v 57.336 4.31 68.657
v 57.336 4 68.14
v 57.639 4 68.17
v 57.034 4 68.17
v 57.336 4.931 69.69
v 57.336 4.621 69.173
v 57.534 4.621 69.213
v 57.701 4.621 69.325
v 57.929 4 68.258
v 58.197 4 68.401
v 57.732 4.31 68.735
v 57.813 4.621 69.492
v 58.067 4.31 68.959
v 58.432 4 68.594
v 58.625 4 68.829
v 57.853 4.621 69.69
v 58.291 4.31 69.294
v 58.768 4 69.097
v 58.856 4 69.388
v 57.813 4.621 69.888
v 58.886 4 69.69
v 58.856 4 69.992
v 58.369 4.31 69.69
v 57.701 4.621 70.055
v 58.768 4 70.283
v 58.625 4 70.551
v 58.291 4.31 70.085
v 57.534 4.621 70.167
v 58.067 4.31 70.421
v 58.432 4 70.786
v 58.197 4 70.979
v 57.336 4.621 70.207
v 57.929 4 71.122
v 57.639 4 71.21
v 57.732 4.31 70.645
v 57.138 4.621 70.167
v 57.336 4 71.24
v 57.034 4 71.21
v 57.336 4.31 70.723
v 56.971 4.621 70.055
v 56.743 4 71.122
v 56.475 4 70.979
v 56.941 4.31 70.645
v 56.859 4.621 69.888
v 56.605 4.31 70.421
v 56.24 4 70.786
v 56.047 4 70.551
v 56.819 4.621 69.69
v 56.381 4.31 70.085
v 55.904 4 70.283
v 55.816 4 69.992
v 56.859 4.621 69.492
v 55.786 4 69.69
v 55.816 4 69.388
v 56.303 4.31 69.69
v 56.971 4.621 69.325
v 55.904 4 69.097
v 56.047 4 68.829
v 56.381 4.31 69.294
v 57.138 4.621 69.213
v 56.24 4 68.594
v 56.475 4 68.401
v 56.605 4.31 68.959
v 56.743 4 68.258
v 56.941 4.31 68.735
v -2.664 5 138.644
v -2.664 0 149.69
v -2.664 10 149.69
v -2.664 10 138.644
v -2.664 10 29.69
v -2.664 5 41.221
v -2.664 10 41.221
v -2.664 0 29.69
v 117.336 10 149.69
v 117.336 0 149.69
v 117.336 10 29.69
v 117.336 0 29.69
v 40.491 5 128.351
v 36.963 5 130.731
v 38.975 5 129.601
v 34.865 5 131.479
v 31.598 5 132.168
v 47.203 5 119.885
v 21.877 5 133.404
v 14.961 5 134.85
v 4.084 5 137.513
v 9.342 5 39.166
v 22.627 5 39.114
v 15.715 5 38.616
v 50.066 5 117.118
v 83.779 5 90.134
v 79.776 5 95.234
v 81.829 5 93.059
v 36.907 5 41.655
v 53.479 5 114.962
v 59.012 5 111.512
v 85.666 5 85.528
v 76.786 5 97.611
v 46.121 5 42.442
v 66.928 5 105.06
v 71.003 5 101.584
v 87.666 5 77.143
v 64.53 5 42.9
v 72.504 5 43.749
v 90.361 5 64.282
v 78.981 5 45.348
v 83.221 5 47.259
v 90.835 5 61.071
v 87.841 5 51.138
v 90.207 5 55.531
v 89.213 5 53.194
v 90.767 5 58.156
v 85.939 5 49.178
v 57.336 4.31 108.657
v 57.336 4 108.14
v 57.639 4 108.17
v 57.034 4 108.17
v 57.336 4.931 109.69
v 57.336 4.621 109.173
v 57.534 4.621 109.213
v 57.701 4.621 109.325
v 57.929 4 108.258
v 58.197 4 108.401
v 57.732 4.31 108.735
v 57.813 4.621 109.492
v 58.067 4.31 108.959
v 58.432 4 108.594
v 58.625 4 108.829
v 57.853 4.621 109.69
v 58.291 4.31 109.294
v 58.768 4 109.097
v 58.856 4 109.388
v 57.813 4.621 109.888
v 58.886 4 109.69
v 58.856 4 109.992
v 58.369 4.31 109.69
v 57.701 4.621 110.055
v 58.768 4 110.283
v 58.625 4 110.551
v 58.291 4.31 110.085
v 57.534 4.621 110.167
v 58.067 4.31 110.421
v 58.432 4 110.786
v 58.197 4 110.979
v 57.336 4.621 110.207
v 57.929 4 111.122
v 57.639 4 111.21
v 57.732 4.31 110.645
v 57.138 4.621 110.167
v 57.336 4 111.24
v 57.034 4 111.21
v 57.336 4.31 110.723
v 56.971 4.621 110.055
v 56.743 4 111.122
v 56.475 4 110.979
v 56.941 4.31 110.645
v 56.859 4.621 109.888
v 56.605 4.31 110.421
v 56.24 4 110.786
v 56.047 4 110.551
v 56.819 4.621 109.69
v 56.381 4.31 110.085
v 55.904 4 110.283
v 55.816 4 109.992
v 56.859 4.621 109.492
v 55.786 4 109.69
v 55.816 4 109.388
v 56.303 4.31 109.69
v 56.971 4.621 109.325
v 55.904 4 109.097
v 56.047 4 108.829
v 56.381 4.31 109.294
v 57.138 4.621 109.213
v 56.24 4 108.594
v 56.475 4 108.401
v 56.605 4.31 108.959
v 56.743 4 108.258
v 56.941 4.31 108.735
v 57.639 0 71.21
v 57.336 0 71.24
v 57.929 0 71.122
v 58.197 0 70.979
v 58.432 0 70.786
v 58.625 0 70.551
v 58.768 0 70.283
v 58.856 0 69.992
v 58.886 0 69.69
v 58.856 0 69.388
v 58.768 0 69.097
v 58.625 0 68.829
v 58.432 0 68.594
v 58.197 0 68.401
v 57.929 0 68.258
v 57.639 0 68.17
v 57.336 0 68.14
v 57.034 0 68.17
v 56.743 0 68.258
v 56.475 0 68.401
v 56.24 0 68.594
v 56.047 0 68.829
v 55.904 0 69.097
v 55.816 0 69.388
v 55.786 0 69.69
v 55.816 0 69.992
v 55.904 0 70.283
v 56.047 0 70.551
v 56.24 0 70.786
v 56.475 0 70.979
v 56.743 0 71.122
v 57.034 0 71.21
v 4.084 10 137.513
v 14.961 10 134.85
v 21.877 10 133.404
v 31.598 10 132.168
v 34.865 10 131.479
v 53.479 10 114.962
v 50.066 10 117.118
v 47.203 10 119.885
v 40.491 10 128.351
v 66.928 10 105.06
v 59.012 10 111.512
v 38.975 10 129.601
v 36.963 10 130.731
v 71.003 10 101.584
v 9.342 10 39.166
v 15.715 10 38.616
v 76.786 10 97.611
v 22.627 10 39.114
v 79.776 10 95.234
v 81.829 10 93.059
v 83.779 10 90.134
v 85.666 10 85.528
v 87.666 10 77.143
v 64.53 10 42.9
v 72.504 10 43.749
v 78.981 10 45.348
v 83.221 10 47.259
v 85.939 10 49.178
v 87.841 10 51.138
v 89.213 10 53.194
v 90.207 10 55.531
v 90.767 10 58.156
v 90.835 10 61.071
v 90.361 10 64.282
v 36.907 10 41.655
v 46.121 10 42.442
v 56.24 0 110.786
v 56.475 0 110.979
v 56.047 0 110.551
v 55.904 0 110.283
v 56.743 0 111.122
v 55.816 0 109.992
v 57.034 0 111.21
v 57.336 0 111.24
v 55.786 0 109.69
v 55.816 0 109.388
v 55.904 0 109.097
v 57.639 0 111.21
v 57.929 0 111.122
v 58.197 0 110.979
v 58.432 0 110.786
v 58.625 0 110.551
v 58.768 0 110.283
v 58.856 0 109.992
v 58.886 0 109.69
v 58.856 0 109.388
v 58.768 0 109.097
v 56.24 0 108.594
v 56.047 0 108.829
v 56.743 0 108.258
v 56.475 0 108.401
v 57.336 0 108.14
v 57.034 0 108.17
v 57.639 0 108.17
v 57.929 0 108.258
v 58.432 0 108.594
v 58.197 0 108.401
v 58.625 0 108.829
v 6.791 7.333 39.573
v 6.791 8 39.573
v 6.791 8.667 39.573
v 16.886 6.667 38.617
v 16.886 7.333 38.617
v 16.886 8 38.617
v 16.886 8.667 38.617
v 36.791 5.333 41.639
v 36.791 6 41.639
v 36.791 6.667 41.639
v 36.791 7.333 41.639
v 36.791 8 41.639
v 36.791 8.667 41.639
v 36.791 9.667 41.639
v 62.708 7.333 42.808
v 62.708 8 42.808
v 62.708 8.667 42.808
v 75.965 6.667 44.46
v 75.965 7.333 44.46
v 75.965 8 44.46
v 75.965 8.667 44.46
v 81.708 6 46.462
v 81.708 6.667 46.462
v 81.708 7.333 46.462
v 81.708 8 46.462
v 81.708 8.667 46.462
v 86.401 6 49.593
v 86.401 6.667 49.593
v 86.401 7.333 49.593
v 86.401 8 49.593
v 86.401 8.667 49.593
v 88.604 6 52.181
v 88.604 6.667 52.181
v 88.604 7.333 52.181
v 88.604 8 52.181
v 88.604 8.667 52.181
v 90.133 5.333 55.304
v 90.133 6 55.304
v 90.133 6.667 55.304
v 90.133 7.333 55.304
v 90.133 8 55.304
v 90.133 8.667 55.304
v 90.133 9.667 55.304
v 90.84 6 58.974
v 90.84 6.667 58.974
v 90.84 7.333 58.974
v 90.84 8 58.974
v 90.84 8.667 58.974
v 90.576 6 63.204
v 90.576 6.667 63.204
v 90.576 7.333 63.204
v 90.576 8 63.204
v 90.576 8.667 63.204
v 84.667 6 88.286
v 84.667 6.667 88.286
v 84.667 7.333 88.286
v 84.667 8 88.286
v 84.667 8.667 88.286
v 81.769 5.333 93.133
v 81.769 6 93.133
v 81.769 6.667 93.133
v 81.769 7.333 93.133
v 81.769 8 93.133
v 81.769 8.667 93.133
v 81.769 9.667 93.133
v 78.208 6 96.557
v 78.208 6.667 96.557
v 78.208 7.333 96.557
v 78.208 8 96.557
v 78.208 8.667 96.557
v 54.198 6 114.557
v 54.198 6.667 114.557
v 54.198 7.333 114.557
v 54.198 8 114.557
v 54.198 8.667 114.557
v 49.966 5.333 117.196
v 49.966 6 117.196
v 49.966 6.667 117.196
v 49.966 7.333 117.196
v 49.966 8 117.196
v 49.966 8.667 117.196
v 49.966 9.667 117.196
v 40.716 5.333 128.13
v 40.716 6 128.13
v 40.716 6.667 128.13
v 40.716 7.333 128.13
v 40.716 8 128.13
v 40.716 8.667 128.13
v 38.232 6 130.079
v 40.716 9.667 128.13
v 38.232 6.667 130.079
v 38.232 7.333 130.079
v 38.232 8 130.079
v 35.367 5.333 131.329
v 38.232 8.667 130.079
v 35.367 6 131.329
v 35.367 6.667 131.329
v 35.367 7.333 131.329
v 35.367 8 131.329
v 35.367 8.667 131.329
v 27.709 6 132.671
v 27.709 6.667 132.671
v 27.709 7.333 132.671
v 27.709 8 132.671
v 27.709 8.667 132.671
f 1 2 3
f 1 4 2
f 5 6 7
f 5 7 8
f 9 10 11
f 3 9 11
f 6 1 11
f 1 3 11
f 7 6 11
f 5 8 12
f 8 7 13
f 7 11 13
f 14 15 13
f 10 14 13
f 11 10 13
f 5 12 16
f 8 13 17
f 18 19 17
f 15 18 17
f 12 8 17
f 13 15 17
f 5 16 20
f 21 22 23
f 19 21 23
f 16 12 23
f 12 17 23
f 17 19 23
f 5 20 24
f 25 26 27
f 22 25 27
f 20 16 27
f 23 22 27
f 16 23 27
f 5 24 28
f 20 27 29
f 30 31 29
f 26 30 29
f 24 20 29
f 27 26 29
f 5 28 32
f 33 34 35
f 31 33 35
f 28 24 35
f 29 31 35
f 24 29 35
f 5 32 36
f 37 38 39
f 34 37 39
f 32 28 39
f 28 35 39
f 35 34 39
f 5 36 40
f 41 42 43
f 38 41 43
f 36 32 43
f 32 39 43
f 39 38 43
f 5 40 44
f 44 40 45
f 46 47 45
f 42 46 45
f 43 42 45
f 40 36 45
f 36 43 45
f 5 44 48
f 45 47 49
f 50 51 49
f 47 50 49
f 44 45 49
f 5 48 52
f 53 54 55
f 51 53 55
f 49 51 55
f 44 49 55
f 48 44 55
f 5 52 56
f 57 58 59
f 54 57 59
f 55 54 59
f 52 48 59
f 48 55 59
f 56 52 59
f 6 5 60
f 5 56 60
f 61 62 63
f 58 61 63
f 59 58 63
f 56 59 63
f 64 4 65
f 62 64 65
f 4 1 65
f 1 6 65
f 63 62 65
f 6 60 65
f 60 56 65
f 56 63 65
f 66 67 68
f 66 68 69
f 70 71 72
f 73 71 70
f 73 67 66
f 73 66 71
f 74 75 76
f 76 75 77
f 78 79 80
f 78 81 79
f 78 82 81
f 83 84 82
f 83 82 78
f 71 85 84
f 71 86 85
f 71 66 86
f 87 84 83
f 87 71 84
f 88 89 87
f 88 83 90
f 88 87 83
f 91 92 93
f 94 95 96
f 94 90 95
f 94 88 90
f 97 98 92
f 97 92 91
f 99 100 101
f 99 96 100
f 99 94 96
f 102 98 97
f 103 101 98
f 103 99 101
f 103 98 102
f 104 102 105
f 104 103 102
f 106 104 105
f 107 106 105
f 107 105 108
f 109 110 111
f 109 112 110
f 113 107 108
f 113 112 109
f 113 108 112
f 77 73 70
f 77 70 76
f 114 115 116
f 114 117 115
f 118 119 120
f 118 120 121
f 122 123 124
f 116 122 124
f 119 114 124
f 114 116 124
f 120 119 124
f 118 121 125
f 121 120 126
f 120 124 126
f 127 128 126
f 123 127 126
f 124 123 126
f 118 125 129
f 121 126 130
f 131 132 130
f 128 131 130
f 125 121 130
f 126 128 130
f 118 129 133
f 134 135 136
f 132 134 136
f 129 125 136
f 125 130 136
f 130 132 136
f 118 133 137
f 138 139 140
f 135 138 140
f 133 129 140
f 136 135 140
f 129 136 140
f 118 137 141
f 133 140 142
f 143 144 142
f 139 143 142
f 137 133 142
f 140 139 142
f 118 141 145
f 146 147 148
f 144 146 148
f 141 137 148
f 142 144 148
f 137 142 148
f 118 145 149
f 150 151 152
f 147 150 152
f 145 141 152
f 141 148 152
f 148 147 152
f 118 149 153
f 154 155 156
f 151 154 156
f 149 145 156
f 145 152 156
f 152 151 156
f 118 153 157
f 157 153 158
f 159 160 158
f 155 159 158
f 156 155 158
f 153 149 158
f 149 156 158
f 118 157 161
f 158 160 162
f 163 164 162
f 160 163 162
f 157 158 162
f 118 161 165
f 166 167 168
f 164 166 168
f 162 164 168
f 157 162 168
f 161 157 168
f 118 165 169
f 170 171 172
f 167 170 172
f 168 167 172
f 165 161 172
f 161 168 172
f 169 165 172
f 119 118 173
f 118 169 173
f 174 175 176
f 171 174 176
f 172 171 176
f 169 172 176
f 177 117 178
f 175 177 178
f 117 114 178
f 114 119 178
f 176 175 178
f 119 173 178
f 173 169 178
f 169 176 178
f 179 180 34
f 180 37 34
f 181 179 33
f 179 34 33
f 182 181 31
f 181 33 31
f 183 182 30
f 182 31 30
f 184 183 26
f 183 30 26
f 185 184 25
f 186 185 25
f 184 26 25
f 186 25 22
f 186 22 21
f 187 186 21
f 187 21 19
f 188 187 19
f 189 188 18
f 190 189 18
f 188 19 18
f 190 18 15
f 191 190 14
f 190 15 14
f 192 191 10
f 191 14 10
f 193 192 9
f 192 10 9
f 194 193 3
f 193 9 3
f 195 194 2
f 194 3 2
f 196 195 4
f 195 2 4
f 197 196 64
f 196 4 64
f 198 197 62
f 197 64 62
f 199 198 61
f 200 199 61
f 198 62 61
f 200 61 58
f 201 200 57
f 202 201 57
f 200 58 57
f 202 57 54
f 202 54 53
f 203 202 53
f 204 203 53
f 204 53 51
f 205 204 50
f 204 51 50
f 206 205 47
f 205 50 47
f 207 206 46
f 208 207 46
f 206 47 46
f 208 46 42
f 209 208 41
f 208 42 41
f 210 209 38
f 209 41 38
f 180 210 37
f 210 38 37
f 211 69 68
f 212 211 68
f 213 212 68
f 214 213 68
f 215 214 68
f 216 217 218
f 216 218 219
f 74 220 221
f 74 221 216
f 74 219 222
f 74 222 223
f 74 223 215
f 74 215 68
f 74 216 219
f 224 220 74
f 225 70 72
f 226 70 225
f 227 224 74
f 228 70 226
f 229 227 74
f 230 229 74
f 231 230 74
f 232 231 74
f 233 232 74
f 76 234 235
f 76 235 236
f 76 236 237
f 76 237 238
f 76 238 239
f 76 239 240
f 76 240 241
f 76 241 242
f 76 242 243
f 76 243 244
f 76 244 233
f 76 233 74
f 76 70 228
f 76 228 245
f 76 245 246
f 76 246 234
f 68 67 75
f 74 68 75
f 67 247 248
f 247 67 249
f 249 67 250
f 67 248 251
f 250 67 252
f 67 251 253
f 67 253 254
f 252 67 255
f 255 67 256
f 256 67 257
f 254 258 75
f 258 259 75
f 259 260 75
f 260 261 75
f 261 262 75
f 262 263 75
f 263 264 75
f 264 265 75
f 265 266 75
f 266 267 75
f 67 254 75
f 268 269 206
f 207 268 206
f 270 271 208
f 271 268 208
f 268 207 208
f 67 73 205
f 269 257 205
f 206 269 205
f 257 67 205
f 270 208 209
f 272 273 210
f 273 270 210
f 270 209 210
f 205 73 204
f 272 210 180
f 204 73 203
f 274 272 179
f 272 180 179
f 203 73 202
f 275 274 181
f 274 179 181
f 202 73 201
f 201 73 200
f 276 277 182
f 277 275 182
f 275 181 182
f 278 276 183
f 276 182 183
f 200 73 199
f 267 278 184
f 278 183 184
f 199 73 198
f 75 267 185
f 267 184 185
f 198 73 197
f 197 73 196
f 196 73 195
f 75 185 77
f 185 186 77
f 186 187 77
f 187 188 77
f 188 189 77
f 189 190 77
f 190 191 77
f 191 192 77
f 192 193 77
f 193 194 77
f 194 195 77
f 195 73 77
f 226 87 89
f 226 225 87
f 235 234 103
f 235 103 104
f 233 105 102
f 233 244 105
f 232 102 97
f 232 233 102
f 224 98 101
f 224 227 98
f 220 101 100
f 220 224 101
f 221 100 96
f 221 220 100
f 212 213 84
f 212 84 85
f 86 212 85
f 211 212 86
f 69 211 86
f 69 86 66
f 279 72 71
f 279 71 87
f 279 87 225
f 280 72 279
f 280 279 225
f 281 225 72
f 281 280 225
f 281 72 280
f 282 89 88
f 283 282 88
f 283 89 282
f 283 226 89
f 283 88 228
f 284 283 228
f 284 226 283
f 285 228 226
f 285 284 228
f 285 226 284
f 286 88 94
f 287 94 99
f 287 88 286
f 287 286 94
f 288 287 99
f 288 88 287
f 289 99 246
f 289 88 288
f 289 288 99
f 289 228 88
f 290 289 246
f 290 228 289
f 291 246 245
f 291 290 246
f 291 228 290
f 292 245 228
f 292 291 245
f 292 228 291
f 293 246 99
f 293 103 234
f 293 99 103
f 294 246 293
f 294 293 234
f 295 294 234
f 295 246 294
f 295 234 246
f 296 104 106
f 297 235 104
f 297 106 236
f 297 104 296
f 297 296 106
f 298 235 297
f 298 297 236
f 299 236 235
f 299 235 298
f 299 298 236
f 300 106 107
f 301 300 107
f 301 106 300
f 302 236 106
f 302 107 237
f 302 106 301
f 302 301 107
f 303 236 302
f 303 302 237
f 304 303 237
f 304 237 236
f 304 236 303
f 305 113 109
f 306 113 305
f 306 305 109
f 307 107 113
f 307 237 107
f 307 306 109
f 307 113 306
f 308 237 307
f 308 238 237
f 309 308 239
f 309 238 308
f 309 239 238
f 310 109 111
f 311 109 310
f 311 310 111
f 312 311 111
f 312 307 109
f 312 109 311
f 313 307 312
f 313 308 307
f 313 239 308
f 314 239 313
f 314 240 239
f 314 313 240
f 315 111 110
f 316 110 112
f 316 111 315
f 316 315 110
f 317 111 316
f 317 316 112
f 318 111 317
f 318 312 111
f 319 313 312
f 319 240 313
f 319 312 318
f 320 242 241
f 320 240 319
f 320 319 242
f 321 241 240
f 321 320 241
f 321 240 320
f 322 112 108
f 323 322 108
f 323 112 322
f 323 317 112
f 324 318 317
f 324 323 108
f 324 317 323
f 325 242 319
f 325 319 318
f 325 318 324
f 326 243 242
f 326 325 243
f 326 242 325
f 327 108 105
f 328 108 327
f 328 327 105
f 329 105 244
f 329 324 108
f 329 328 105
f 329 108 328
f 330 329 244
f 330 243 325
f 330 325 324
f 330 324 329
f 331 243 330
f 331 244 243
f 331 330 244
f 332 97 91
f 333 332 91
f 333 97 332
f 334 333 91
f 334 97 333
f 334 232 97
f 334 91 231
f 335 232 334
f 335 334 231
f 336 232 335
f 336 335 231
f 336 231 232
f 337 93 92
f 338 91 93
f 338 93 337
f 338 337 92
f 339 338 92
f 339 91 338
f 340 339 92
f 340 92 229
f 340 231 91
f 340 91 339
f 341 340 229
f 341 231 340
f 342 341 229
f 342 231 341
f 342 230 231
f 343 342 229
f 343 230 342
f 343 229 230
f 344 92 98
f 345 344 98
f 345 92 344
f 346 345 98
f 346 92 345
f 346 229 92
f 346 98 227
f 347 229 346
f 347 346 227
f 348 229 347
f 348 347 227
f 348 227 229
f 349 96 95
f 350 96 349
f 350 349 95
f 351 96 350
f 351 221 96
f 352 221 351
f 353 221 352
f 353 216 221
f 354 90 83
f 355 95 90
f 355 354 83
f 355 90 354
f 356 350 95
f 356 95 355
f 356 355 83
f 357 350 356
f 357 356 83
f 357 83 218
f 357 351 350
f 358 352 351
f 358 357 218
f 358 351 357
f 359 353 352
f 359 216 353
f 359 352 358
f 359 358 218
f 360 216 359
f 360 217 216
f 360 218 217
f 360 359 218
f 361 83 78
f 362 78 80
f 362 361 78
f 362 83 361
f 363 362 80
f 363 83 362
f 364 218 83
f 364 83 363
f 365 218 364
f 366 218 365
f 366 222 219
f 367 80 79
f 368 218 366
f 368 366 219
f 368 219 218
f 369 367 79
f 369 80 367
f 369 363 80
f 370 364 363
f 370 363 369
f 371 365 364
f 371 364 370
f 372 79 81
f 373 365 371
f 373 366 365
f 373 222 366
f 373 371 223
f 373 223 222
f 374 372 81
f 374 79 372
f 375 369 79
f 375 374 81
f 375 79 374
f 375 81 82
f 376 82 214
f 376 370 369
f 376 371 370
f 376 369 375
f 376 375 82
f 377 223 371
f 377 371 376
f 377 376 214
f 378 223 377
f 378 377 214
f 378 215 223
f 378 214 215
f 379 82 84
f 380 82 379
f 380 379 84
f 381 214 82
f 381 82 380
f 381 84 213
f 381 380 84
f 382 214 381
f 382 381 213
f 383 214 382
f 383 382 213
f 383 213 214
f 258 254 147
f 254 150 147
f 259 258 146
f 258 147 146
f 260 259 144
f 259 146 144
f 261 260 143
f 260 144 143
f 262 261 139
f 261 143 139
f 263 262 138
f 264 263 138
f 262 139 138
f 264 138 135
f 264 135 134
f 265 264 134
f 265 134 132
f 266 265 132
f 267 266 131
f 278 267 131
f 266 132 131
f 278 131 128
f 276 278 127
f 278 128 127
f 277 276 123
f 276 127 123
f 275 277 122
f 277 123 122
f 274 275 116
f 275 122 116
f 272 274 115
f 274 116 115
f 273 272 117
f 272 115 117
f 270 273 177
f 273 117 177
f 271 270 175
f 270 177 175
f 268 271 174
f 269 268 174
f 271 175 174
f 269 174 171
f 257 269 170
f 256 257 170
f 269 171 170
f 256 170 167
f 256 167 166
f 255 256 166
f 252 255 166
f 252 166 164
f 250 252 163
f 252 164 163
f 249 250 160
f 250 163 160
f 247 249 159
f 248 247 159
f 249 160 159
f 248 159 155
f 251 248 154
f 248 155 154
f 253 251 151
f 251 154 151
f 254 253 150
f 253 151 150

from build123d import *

# Parameters (mm, degrees)
SCHIZZO2_W                   = 120
SCHIZZO2_H                   = 120
ESTRUSIONE_ESTRUSIONE2_DEPTH = 10
TAGLIO_ESTRUSIONE1_DEPTH     = 5
FORO_PER_VITE_M2_5_2_D       = 3.1
FORO_PER_VITE_M2_5_2_DEPTH   = 4
FORO_PER_VITE_M2_5_2_TIP     = 0.931333959


with BuildPart() as part:
    # Schizzo2 → Estrusione-Estrusione2 (new body)
    with BuildSketch(Plane(origin=(0, 0, 0), x_dir=(1, 0, 0), z_dir=(0, 1, 0))):
        with Locations((57.336140445, -89.689917766)):
            Rectangle(SCHIZZO2_W, SCHIZZO2_H)
    extrude(amount=ESTRUSIONE_ESTRUSIONE2_DEPTH)

    # Schizzo3 → Taglio-Estrusione1 (cut)
    with BuildSketch(Plane(origin=(0, 10, 0), x_dir=(1, 0, 0), z_dir=(0, 1, 0))):
        with BuildLine():
            Line((-2.663859555, -41.221032808), (-2.663859555, -138.643920272))
            add(Edge.make_bspline(
                [(-2.663859555, -41.221032808), (3.353453487, -40.416646042), (16.340457254, -36.675476812), (38.910501362, -43.235816996), (63.335822523, -41.948555632), (86.602392347, -45.377590215), (92.061905469, -58.175628156), (88.277693124, -72.156151016), (85.643137691, -94.590278544), (74.339105676, -98.395322843), (64.976553317, -106.817997229), (59.257506312, -111.938966377), (46.950934572, -118.429256318), (41.01599655, -130.652416152), (33.034149123, -132.147753259), (16.009832786, -133.868551103), (5.75694627, -137.747753924), (-2.663859555, -138.643920272)],
                knots=[0, 0, 0, 0, 0.094415624, 0.184087983, 0.301355615, 0.426619626, 0.503602752, 0.520543902, 0.596031123, 0.700435041, 0.720928373, 0.792071547, 0.806901849, 0.860338501, 0.916687335, 0.930653485, 1, 1, 1, 1], degree=3))
        make_face()
    extrude(amount=-TAGLIO_ESTRUSIONE1_DEPTH, mode=Mode.SUBTRACT)

    # Foro per Vite M2.5-2
    with Locations(Plane(origin=(57.336140445, 0, 69.689917766), x_dir=(0, 0, -1), z_dir=(0, -1, 0))):
        with Locations((0, 0), (-40, 0)):
            Hole(FORO_PER_VITE_M2_5_2_D / 2, depth=FORO_PER_VITE_M2_5_2_DEPTH)
            with Locations((0, 0, -(FORO_PER_VITE_M2_5_2_DEPTH + FORO_PER_VITE_M2_5_2_TIP / 2))):  # 118° drill point
                Cone(0, FORO_PER_VITE_M2_5_2_D / 2, FORO_PER_VITE_M2_5_2_TIP, mode=Mode.SUBTRACT)


solid = part.part
